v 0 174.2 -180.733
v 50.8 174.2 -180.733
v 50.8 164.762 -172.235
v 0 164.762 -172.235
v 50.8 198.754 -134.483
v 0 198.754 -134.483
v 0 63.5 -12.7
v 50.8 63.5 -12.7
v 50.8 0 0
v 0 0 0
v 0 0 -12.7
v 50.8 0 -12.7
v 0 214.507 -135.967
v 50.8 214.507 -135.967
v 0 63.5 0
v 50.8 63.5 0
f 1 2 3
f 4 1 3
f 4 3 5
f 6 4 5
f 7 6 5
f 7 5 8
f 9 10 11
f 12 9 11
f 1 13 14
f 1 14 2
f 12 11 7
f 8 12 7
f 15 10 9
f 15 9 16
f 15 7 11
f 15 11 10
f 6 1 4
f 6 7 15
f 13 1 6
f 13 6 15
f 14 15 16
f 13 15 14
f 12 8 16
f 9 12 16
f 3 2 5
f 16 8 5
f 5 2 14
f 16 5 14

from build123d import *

# Parameters (mm, degrees)
SKETCH1_W           = 12.7
SKETCH1_H           = 63.5
BOSS_EXTRUDE1_DEPTH = 50.8


with BuildPart() as part:
    # Sketch1 → Boss-Extrude1 (new body)
    with BuildSketch(Plane(origin=(0, 0, 0), x_dir=(0, 0, -1), z_dir=(1, 0, 0))):
        Polygon((134.483136253, 198.753875218), (12.7, 63.5), (0, 63.5), (135.967339212, 214.507028537), (180.732852088, 174.199979698), (172.234893387, 164.762040415), align=None)
        with Locations((6.35, 31.75)):
            Rectangle(SKETCH1_W, SKETCH1_H)
    extrude(amount=BOSS_EXTRUDE1_DEPTH)


solid = part.part
